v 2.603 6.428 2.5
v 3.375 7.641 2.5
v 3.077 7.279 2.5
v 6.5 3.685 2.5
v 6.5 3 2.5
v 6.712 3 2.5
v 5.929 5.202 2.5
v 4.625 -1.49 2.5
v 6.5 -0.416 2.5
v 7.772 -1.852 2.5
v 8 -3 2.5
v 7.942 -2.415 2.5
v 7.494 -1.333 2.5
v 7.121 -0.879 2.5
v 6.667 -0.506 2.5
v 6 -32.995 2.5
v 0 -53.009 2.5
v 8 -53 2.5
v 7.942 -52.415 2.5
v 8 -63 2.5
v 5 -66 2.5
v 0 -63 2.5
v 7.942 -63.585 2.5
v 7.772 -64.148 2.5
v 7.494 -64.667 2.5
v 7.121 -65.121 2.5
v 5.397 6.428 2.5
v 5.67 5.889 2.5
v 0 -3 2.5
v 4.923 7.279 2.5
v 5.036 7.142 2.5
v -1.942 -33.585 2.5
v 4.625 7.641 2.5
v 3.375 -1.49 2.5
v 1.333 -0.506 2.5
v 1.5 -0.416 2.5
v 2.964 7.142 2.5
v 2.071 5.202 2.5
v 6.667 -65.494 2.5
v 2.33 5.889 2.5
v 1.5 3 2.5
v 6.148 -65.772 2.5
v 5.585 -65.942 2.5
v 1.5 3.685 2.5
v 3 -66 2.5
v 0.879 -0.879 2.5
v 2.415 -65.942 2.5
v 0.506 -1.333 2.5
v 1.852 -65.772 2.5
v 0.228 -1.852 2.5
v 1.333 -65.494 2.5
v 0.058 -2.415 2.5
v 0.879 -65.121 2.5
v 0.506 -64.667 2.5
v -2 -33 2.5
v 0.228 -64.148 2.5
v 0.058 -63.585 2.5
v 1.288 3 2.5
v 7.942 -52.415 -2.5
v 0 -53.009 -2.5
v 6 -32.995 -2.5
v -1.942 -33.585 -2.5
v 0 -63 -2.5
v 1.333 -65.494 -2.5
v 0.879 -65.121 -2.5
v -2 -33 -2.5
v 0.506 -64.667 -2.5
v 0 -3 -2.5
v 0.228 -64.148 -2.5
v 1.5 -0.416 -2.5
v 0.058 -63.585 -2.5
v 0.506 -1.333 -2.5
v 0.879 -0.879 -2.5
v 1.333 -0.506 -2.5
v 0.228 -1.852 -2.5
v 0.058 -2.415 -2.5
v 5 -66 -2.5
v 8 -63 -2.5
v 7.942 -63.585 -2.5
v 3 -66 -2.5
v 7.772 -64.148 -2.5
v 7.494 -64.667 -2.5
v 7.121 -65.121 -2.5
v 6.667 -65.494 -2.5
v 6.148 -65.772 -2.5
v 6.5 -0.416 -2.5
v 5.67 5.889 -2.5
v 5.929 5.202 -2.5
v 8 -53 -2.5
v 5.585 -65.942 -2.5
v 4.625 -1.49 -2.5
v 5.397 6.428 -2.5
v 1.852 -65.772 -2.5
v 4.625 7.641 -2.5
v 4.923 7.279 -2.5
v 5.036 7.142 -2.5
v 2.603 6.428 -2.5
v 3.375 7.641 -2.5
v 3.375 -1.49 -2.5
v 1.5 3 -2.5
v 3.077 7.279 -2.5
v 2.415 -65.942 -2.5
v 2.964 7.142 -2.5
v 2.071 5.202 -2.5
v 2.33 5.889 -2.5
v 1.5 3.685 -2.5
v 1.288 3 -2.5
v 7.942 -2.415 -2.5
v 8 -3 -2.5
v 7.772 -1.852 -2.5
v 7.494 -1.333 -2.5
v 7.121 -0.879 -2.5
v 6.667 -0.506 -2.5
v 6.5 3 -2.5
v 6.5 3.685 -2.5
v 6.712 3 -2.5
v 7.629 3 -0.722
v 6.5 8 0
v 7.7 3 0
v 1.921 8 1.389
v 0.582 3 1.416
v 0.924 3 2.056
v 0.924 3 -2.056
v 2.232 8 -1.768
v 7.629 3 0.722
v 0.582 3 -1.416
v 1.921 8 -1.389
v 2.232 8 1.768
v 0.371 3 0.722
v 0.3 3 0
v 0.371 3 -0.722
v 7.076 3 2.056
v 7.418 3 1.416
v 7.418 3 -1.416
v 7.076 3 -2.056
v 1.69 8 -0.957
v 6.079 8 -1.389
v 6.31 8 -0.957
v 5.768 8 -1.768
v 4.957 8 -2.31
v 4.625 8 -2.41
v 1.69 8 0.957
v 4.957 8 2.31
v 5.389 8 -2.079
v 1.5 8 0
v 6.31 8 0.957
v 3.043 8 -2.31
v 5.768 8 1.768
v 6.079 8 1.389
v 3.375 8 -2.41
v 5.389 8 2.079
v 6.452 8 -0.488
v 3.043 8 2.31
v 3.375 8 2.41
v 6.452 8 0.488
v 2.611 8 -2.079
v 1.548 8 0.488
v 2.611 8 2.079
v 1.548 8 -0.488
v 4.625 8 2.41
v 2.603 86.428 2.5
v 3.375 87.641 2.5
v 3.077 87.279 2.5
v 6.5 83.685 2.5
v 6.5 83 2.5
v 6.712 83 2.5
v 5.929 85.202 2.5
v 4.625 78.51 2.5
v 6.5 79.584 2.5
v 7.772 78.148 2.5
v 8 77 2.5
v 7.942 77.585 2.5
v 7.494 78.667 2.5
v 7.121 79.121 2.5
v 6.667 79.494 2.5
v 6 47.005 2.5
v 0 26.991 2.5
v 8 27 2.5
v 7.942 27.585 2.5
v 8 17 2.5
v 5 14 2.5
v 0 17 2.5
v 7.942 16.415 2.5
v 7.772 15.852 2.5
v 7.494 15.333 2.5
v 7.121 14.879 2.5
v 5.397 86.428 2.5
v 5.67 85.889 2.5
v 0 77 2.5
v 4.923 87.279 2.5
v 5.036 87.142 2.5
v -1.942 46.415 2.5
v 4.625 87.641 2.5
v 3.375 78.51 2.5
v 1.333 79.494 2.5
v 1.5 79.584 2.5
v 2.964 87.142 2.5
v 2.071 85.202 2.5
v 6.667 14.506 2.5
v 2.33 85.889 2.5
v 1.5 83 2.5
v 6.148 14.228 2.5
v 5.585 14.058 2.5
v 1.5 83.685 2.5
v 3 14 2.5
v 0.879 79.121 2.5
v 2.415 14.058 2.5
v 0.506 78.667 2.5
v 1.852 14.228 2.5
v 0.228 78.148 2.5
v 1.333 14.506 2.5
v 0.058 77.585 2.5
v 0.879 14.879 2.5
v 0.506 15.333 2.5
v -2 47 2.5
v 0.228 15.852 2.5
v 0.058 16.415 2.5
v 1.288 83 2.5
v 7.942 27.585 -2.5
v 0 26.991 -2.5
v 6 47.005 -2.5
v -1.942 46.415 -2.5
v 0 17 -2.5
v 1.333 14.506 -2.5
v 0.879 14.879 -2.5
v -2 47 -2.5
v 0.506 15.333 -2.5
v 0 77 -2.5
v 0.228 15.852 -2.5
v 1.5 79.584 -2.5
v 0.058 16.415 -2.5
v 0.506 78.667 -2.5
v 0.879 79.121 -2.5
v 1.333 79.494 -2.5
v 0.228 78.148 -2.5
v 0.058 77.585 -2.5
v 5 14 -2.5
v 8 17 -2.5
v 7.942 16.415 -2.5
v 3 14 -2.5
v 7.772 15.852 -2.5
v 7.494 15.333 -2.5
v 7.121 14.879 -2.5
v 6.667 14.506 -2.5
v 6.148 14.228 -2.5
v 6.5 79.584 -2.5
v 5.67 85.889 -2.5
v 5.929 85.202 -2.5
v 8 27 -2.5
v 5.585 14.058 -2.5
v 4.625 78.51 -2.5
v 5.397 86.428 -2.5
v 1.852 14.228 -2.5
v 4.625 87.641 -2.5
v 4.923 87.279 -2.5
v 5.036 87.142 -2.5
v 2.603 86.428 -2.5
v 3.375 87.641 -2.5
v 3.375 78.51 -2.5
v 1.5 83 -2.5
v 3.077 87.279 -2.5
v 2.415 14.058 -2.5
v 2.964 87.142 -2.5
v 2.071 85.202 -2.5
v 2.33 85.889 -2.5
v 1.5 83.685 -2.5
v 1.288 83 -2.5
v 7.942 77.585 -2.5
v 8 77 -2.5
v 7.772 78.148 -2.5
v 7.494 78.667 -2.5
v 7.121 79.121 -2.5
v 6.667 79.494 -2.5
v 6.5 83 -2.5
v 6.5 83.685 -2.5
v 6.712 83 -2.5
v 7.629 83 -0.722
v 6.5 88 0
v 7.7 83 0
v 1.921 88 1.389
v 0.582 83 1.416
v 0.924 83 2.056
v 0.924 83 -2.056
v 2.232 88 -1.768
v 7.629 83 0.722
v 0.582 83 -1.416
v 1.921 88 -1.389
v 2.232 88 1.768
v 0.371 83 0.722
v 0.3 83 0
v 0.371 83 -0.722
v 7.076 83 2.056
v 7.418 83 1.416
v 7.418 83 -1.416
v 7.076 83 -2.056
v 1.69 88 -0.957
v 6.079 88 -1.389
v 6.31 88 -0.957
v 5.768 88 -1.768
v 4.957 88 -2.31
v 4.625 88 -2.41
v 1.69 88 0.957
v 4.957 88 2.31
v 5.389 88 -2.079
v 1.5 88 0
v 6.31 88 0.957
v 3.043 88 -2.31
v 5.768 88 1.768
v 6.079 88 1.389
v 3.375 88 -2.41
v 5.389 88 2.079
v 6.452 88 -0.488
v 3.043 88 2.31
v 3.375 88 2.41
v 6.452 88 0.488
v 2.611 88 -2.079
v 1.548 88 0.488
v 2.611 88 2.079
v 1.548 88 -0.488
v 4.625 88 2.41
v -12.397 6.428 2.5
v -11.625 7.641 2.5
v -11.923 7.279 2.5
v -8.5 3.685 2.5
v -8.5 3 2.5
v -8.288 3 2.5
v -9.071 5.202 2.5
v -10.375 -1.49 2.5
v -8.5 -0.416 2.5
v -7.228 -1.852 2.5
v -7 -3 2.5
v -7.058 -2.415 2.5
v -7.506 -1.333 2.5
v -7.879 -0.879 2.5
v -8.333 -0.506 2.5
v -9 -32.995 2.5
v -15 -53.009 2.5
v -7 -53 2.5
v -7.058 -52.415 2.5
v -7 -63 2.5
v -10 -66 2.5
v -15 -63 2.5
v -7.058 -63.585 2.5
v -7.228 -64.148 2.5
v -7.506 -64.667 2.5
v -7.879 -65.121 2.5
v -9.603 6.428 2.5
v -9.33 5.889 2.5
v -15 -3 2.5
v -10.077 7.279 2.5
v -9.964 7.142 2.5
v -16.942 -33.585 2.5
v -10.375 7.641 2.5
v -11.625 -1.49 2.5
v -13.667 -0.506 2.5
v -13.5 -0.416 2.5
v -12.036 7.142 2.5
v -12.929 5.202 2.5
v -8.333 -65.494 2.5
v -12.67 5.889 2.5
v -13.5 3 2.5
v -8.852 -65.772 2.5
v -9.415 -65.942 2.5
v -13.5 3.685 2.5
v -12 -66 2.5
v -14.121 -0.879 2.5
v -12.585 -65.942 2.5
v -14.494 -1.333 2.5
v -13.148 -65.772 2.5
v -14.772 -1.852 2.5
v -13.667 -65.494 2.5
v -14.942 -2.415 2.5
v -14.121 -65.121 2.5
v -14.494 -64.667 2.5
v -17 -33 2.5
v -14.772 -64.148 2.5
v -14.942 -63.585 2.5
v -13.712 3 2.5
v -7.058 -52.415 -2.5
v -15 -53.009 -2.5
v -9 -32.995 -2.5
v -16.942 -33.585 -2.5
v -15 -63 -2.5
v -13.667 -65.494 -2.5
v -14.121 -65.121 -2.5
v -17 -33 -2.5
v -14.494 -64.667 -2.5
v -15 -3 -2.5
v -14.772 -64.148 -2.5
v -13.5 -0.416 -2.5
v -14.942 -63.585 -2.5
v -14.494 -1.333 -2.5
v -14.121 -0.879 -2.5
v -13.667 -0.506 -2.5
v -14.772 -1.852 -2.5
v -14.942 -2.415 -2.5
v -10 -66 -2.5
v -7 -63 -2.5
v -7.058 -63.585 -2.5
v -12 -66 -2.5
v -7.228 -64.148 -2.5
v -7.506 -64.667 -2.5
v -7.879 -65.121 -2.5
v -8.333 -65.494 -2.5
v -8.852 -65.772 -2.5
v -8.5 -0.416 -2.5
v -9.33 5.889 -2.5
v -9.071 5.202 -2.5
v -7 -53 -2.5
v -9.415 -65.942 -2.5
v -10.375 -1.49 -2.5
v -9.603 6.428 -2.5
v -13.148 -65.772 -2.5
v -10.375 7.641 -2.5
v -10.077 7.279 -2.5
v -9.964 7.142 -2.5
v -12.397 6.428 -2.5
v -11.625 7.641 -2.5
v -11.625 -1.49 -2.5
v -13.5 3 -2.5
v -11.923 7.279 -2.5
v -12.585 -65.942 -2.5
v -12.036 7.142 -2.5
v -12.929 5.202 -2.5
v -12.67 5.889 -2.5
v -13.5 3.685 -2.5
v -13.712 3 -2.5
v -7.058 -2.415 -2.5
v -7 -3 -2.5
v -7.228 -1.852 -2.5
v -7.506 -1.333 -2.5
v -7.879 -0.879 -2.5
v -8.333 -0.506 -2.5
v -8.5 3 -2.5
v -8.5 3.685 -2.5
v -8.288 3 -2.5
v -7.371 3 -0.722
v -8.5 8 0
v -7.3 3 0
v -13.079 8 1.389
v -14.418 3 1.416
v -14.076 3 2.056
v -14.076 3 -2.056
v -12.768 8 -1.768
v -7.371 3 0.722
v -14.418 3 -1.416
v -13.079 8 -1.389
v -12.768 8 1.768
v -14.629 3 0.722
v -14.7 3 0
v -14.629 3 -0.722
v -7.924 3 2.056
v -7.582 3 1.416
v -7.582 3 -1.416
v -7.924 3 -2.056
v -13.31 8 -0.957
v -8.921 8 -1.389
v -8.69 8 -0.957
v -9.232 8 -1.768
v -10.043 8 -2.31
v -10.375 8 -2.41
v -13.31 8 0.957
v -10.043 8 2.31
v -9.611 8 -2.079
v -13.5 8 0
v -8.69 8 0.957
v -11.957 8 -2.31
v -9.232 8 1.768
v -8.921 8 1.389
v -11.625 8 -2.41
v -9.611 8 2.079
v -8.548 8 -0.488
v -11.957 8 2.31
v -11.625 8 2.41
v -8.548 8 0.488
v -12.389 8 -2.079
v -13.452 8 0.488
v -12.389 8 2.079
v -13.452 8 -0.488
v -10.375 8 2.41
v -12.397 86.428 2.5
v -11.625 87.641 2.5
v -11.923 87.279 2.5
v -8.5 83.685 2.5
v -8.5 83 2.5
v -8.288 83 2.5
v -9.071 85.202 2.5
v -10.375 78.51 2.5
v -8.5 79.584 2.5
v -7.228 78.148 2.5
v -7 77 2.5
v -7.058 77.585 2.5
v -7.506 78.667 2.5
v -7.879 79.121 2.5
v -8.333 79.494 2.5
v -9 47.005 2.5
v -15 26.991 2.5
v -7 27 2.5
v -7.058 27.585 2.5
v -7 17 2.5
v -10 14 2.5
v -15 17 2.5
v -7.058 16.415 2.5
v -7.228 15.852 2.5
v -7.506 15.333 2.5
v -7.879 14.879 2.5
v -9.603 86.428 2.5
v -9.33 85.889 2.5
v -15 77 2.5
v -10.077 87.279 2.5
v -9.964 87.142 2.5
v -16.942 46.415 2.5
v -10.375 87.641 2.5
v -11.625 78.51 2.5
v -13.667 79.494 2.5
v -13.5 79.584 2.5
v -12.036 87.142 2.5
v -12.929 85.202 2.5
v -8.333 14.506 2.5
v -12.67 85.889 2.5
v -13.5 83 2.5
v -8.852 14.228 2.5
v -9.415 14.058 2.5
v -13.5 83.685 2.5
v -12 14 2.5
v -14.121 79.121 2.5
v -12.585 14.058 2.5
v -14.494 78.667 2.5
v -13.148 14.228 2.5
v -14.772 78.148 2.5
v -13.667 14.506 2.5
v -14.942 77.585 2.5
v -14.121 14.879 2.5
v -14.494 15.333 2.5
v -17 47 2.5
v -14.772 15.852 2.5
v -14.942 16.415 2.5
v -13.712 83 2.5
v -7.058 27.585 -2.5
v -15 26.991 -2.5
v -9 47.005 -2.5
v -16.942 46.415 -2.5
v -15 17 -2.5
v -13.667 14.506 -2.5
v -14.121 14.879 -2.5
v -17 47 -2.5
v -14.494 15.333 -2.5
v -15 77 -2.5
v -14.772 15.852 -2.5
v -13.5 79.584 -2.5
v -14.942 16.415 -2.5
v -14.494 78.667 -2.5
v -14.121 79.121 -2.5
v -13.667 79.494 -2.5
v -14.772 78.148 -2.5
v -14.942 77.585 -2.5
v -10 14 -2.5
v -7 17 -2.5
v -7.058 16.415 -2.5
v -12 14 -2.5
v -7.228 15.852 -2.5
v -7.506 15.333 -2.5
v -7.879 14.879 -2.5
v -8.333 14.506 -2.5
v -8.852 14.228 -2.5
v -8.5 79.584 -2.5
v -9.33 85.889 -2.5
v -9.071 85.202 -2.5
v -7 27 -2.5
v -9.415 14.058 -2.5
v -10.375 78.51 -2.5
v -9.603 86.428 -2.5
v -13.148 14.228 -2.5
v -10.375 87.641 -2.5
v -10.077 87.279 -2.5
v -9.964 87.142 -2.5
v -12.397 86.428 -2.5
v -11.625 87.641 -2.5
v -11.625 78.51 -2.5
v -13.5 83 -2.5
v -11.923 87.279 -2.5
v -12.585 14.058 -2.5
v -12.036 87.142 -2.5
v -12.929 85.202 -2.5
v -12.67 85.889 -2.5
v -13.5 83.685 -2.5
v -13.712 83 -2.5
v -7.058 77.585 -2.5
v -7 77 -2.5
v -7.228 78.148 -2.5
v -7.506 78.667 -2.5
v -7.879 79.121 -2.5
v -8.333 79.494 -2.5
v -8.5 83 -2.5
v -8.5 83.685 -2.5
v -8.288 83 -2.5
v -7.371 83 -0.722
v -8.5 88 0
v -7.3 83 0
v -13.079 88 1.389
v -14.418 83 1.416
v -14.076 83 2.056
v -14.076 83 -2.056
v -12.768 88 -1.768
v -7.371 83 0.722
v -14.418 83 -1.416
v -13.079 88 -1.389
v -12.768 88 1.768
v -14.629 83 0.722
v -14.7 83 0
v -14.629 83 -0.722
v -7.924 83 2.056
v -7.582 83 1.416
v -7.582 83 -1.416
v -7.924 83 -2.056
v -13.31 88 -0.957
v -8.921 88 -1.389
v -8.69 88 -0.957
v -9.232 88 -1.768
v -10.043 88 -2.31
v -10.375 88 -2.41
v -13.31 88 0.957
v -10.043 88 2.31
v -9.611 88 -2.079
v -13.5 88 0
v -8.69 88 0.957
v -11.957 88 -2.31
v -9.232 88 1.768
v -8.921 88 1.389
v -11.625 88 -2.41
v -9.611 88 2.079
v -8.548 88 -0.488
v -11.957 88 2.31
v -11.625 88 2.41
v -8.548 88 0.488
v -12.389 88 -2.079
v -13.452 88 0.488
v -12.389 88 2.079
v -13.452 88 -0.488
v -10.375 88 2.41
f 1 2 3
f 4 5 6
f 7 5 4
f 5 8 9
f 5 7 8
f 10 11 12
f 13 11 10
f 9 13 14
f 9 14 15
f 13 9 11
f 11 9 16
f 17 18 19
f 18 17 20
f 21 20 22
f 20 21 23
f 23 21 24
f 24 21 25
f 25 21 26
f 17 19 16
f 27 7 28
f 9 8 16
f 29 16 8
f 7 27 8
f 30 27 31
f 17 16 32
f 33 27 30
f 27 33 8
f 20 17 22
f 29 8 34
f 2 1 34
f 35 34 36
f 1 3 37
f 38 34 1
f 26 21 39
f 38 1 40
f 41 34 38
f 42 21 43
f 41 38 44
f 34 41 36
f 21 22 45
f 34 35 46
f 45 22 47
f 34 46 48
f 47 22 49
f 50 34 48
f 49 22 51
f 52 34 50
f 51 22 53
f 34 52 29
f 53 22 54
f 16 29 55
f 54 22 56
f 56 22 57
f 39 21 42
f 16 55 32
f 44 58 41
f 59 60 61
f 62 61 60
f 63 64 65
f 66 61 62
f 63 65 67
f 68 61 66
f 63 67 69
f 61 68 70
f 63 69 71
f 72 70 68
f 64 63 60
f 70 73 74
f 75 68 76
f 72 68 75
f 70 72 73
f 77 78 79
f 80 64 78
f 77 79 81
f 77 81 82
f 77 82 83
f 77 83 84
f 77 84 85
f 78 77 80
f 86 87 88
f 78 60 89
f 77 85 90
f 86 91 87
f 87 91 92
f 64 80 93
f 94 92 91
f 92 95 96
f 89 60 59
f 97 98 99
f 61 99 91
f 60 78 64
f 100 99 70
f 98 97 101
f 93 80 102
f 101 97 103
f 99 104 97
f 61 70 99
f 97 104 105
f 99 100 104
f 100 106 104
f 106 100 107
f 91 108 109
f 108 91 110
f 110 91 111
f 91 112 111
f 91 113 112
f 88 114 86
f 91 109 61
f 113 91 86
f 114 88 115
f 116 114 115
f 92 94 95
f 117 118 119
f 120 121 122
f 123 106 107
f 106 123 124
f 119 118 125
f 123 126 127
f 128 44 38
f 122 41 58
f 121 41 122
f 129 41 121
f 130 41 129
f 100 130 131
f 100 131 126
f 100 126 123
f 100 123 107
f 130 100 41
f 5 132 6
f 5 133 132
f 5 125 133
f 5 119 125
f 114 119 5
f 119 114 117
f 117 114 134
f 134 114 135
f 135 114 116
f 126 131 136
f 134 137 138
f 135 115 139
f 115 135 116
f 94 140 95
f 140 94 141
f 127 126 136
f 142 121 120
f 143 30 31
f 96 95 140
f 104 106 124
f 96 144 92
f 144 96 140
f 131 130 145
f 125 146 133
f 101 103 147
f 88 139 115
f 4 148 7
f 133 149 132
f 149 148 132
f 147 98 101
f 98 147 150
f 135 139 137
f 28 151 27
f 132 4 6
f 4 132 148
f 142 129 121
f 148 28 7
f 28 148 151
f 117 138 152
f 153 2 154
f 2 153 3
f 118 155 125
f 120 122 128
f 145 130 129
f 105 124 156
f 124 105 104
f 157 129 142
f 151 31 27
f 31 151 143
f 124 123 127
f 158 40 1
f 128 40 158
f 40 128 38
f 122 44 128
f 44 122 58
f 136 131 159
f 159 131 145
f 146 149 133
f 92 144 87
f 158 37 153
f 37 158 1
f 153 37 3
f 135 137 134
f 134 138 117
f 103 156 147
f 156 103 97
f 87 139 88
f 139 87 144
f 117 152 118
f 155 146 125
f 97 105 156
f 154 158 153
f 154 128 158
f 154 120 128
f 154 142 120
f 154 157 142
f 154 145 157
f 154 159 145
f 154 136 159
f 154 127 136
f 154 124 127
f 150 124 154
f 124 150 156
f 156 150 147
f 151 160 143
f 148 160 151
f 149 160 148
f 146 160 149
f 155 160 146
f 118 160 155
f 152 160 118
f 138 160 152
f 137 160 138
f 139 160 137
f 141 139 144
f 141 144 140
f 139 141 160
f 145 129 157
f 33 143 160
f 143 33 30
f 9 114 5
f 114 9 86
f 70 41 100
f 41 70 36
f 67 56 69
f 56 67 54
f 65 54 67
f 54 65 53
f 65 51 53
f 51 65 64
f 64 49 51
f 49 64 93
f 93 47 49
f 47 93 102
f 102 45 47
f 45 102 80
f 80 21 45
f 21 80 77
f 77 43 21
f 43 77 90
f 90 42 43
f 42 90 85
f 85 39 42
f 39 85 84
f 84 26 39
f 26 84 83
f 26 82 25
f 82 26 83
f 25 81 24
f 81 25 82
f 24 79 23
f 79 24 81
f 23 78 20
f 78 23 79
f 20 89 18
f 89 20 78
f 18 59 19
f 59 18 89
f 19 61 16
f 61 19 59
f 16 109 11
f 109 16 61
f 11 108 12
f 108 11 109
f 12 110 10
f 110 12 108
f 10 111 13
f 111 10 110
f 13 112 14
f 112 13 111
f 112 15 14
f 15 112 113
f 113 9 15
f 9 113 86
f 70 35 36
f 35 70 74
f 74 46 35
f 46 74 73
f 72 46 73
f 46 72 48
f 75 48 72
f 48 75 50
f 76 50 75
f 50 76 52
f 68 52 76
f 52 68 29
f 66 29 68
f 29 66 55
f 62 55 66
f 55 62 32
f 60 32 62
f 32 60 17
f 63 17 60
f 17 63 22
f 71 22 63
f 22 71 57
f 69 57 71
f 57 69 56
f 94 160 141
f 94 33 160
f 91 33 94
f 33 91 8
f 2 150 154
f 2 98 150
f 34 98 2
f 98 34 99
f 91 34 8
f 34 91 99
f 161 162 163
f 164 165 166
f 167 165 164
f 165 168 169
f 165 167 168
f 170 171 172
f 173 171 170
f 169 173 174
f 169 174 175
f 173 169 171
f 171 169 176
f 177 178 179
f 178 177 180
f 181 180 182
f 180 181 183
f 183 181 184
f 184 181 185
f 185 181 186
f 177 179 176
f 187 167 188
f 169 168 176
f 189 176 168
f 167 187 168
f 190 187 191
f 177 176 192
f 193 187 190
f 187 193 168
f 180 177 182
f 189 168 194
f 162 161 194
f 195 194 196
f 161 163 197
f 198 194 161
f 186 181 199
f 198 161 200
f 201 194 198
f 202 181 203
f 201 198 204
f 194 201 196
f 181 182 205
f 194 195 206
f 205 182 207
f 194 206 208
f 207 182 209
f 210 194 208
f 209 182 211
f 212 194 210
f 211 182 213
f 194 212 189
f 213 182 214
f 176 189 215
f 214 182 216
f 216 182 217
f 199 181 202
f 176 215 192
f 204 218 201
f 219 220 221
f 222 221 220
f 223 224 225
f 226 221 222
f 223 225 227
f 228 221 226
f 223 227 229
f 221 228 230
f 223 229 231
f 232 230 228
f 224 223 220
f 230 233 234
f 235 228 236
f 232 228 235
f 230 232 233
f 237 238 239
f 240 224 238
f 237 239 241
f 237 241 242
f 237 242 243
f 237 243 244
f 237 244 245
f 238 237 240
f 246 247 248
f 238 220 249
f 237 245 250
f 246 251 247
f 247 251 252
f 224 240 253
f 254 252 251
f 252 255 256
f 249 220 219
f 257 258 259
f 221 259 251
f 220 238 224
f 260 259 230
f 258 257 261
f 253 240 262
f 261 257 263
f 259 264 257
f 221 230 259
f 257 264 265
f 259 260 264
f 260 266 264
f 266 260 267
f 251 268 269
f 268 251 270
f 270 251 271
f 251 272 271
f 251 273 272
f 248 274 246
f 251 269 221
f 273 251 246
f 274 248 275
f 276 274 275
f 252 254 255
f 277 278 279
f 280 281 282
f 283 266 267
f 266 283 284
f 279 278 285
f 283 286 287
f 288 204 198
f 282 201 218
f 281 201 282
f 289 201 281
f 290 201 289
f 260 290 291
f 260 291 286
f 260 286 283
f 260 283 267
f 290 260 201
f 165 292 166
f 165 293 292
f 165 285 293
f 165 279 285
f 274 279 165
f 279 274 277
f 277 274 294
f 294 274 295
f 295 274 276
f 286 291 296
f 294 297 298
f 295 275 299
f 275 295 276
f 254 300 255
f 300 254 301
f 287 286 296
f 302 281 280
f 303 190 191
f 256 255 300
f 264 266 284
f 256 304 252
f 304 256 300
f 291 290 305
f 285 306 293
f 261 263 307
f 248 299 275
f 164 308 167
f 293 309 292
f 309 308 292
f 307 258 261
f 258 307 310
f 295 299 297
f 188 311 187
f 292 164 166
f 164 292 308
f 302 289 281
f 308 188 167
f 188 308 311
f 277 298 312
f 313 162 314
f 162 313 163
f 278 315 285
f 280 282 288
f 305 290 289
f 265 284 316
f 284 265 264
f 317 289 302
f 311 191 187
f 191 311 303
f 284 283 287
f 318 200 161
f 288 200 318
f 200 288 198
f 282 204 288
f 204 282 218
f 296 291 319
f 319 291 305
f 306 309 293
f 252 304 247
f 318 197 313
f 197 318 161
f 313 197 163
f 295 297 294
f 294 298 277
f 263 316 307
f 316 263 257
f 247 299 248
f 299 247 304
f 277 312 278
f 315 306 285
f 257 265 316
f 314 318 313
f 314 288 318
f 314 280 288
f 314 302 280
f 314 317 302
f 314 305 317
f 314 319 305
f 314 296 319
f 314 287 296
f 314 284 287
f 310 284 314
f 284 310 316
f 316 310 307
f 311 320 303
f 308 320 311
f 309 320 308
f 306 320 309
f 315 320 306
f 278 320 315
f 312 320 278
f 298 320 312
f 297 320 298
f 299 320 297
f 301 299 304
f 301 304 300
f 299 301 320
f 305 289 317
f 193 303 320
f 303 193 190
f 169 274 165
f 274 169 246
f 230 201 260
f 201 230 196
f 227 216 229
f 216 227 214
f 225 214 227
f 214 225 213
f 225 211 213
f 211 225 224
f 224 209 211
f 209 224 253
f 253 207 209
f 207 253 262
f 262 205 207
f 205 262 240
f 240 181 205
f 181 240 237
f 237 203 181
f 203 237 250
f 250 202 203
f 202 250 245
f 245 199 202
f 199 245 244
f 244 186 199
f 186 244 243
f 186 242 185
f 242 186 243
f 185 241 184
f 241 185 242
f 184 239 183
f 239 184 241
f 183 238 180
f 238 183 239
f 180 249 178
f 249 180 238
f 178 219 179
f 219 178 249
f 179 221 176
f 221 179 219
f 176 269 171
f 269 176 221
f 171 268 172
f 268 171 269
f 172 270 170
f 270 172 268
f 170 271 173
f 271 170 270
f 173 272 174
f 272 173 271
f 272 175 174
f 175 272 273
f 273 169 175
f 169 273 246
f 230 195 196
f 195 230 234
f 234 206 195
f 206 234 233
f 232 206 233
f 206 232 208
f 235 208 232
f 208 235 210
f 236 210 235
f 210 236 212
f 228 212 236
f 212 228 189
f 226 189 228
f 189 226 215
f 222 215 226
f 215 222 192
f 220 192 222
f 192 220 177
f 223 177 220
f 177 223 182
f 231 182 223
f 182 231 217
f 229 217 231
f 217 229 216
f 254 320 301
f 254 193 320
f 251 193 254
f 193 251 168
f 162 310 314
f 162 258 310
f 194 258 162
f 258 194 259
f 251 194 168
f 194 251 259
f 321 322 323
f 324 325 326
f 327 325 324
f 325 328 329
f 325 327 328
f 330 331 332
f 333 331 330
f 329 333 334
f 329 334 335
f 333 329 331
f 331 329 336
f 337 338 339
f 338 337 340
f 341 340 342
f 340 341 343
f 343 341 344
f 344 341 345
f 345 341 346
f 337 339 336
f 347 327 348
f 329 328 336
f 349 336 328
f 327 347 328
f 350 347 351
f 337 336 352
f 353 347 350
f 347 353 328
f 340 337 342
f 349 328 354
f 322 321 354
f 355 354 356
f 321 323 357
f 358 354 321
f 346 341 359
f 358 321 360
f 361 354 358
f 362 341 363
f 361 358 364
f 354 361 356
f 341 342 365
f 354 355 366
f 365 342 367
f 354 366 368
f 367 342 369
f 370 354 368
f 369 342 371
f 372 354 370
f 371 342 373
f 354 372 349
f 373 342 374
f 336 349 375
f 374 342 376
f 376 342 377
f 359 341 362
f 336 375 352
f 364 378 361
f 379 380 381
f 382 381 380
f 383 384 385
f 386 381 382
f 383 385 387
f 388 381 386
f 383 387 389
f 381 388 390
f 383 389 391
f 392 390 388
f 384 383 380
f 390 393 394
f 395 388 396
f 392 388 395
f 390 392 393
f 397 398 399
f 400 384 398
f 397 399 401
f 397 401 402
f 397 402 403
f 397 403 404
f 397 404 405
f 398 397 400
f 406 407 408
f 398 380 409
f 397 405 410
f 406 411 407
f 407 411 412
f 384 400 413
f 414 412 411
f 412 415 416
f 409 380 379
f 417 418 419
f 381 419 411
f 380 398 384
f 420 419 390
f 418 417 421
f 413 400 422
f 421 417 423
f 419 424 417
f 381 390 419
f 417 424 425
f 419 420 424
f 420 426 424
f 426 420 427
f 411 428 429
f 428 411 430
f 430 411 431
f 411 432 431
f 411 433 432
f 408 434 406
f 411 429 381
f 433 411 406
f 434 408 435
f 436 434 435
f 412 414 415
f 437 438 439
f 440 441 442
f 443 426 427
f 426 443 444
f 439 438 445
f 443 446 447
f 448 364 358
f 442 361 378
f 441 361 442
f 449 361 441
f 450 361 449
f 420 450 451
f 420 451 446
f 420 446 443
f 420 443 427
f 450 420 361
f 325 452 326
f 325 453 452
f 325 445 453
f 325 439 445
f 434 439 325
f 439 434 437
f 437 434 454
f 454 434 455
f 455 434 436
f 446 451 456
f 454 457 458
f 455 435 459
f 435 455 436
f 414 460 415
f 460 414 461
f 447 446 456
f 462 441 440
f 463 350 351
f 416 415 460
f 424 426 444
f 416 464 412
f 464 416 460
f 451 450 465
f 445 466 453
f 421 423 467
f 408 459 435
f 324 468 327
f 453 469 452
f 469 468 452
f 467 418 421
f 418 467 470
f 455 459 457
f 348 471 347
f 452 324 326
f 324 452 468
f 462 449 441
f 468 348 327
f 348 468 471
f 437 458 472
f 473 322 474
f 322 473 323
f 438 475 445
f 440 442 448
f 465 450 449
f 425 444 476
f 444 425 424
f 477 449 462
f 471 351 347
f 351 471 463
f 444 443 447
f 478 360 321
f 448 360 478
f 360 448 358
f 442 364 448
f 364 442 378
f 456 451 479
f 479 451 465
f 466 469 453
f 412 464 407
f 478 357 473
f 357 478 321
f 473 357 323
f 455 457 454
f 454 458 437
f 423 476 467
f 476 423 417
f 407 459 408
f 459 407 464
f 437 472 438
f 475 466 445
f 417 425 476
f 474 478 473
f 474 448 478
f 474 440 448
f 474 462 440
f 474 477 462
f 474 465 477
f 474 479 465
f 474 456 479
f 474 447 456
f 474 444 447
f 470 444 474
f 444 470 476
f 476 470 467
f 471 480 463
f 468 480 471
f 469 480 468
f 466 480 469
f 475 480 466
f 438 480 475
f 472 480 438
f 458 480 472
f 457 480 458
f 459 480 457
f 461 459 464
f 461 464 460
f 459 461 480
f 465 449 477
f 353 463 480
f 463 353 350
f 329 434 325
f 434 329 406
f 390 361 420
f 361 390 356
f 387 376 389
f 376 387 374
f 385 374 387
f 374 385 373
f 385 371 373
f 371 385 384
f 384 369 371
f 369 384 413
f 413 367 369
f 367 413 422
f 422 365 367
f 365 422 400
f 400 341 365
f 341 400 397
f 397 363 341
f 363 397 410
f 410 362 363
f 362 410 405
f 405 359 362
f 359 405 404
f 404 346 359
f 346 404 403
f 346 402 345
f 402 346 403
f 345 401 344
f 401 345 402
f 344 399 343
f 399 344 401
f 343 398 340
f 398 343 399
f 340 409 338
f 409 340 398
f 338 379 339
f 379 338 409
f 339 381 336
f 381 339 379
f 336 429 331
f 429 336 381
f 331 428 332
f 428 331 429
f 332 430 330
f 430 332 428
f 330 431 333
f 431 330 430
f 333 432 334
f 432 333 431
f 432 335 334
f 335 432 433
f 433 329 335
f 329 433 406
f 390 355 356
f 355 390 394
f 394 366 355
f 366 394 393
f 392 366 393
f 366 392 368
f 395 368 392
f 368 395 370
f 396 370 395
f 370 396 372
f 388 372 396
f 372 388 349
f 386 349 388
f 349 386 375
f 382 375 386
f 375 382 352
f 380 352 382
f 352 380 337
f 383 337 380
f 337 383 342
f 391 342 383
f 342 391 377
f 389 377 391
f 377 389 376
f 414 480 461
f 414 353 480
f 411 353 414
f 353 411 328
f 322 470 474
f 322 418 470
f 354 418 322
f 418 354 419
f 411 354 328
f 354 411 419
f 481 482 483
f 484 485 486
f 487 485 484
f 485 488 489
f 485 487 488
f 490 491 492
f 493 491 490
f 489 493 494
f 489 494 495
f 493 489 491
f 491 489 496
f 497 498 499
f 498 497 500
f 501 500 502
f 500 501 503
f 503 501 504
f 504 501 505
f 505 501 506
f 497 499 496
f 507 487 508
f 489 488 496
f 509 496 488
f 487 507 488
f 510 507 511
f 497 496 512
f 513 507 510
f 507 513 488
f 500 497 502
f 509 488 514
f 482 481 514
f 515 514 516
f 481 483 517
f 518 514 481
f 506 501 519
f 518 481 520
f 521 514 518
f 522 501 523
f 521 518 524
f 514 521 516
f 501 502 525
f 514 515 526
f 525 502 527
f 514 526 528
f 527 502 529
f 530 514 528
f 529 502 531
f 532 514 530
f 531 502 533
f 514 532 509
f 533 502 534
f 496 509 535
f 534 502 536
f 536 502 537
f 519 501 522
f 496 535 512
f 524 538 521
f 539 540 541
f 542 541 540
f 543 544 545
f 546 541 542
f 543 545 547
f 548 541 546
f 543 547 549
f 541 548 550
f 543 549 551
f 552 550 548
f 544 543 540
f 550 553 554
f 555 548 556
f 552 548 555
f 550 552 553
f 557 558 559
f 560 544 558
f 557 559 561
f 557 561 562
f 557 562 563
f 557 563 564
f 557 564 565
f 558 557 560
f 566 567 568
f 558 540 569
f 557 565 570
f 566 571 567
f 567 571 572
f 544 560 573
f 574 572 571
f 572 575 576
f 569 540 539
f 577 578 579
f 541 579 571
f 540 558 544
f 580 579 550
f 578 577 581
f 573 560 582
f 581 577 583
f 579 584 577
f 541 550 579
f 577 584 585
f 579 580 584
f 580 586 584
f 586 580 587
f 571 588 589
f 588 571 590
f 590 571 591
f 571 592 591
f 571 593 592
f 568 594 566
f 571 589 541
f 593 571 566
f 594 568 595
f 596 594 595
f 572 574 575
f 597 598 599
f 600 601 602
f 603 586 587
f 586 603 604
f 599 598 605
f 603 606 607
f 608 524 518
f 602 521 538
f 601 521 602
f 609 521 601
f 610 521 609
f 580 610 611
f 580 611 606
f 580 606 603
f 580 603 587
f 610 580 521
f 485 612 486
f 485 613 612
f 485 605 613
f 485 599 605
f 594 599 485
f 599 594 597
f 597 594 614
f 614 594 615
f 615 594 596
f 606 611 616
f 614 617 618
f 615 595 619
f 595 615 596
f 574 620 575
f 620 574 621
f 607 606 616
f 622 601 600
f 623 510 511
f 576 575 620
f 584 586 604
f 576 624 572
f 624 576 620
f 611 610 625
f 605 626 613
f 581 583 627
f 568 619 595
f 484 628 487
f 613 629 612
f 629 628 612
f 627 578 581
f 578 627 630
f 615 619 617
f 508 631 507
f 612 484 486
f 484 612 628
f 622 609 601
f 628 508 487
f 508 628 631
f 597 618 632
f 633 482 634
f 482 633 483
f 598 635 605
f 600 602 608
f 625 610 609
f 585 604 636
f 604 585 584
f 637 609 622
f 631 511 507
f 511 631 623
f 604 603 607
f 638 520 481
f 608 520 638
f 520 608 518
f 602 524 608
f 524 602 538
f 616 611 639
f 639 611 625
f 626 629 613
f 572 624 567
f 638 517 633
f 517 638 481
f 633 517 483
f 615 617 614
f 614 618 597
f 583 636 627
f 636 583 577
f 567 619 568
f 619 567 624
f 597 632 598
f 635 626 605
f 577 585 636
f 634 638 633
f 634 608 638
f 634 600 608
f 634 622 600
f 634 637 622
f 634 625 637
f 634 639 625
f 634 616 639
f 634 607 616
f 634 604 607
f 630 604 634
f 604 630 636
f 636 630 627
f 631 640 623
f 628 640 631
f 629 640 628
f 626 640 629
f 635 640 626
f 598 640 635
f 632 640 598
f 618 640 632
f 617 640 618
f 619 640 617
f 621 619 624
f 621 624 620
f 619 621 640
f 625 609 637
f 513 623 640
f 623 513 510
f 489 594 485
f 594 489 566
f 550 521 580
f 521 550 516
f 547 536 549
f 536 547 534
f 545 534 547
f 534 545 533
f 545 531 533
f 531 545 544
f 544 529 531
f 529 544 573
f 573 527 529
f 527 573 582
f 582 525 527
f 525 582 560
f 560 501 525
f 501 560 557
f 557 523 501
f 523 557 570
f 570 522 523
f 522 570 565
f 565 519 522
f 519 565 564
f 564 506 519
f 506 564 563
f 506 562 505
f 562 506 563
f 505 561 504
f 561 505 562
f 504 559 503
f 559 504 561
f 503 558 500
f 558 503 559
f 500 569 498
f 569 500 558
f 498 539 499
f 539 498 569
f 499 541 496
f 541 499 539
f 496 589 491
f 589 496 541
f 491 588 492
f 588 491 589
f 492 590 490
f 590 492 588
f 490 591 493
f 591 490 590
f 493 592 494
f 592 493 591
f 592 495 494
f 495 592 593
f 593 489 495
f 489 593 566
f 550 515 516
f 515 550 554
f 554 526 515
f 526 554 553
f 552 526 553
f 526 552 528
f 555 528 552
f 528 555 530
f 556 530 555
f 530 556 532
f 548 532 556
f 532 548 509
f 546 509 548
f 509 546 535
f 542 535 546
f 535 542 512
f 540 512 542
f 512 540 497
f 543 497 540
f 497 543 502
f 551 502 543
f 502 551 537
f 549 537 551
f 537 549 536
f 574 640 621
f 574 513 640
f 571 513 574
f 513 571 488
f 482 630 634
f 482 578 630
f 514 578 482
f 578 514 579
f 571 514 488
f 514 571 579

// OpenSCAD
// file: config.scad
pad = 0.01;
smooth = 32;

$fn = smooth;

peg_gap = 1.25;
peg_length = 6;
// file: peg.scad
include <config.scad>

module peg(l)
{
	difference(){
		union(){
			cube([5, l, 5], center = true);
			intersection()
			{
				cube([12, 40, 5], center = true);
				translate([0, 5/2+l/2, 0])
					rotate([-90, 0, 0])
						cylinder(r1 = 7.4/2, r2 = 5/2, h = 5, center = true);
			}
		}
		*translate([0, 2, 0])
			cube([1.25, l*2.5, 5 + pad], center = true);
	}
}
// file: hook.scad
use <peg.scad>
include <config.scad>

module hook(w=20, h=5)
{
	mink_r = 3;

	difference()
	{
		union(){
			translate([mink_r, mink_r, -h/2])
				linear_extrude(height=h)
					minkowski(){
						polygon(
								points=[[0,0],[30,-w],[50,0],[60,0],
										[60,w],[50,w],[30,0],[0,w]],
								paths=[[0,1,2,3,4,5,6,7]]);
						circle(r=mink_r);
					}

			translate([0, (h + mink_r)/2,0])
				rotate([0,0,90])
					peg(peg_length);
		}

		#rotate([0,0,90])
			translate([(h + mink_r)/2, w/2 + peg_length/2 + pad, 0])
				cube([peg_gap, w * 2.5 + peg_length, h+pad], center = true);
	}
}
// file: tool_loop.scad
use <peg.scad>
include <config.scad>

module tool_loop(r1=9, r2=10, w=20, h=5) {
	difference(){
		union(){
			minkowski(){
				cube([w, w, h-pad], center = true);
				translate([0, 0, 0])cylinder(r=2, h=pad, center = true);
			}
			translate([0, w/2 + peg_length/2 + 0.25, 0])
				peg(peg_length);
		}
		cylinder(h=h+pad, r1=r1, r2=r2, center = true);
		translate([0, (w + peg_length)/2, 0])
			cube([peg_gap, w + peg_length, h+pad], center = true);
	}
}
// main file
use <tool_loop.scad>
use <hook.scad>

// hook
for(x=[0:1],y=[0:1])
translate([-15*x,80*y,0]) rotate([0,0,-90]) hook(w=2, h=5);
